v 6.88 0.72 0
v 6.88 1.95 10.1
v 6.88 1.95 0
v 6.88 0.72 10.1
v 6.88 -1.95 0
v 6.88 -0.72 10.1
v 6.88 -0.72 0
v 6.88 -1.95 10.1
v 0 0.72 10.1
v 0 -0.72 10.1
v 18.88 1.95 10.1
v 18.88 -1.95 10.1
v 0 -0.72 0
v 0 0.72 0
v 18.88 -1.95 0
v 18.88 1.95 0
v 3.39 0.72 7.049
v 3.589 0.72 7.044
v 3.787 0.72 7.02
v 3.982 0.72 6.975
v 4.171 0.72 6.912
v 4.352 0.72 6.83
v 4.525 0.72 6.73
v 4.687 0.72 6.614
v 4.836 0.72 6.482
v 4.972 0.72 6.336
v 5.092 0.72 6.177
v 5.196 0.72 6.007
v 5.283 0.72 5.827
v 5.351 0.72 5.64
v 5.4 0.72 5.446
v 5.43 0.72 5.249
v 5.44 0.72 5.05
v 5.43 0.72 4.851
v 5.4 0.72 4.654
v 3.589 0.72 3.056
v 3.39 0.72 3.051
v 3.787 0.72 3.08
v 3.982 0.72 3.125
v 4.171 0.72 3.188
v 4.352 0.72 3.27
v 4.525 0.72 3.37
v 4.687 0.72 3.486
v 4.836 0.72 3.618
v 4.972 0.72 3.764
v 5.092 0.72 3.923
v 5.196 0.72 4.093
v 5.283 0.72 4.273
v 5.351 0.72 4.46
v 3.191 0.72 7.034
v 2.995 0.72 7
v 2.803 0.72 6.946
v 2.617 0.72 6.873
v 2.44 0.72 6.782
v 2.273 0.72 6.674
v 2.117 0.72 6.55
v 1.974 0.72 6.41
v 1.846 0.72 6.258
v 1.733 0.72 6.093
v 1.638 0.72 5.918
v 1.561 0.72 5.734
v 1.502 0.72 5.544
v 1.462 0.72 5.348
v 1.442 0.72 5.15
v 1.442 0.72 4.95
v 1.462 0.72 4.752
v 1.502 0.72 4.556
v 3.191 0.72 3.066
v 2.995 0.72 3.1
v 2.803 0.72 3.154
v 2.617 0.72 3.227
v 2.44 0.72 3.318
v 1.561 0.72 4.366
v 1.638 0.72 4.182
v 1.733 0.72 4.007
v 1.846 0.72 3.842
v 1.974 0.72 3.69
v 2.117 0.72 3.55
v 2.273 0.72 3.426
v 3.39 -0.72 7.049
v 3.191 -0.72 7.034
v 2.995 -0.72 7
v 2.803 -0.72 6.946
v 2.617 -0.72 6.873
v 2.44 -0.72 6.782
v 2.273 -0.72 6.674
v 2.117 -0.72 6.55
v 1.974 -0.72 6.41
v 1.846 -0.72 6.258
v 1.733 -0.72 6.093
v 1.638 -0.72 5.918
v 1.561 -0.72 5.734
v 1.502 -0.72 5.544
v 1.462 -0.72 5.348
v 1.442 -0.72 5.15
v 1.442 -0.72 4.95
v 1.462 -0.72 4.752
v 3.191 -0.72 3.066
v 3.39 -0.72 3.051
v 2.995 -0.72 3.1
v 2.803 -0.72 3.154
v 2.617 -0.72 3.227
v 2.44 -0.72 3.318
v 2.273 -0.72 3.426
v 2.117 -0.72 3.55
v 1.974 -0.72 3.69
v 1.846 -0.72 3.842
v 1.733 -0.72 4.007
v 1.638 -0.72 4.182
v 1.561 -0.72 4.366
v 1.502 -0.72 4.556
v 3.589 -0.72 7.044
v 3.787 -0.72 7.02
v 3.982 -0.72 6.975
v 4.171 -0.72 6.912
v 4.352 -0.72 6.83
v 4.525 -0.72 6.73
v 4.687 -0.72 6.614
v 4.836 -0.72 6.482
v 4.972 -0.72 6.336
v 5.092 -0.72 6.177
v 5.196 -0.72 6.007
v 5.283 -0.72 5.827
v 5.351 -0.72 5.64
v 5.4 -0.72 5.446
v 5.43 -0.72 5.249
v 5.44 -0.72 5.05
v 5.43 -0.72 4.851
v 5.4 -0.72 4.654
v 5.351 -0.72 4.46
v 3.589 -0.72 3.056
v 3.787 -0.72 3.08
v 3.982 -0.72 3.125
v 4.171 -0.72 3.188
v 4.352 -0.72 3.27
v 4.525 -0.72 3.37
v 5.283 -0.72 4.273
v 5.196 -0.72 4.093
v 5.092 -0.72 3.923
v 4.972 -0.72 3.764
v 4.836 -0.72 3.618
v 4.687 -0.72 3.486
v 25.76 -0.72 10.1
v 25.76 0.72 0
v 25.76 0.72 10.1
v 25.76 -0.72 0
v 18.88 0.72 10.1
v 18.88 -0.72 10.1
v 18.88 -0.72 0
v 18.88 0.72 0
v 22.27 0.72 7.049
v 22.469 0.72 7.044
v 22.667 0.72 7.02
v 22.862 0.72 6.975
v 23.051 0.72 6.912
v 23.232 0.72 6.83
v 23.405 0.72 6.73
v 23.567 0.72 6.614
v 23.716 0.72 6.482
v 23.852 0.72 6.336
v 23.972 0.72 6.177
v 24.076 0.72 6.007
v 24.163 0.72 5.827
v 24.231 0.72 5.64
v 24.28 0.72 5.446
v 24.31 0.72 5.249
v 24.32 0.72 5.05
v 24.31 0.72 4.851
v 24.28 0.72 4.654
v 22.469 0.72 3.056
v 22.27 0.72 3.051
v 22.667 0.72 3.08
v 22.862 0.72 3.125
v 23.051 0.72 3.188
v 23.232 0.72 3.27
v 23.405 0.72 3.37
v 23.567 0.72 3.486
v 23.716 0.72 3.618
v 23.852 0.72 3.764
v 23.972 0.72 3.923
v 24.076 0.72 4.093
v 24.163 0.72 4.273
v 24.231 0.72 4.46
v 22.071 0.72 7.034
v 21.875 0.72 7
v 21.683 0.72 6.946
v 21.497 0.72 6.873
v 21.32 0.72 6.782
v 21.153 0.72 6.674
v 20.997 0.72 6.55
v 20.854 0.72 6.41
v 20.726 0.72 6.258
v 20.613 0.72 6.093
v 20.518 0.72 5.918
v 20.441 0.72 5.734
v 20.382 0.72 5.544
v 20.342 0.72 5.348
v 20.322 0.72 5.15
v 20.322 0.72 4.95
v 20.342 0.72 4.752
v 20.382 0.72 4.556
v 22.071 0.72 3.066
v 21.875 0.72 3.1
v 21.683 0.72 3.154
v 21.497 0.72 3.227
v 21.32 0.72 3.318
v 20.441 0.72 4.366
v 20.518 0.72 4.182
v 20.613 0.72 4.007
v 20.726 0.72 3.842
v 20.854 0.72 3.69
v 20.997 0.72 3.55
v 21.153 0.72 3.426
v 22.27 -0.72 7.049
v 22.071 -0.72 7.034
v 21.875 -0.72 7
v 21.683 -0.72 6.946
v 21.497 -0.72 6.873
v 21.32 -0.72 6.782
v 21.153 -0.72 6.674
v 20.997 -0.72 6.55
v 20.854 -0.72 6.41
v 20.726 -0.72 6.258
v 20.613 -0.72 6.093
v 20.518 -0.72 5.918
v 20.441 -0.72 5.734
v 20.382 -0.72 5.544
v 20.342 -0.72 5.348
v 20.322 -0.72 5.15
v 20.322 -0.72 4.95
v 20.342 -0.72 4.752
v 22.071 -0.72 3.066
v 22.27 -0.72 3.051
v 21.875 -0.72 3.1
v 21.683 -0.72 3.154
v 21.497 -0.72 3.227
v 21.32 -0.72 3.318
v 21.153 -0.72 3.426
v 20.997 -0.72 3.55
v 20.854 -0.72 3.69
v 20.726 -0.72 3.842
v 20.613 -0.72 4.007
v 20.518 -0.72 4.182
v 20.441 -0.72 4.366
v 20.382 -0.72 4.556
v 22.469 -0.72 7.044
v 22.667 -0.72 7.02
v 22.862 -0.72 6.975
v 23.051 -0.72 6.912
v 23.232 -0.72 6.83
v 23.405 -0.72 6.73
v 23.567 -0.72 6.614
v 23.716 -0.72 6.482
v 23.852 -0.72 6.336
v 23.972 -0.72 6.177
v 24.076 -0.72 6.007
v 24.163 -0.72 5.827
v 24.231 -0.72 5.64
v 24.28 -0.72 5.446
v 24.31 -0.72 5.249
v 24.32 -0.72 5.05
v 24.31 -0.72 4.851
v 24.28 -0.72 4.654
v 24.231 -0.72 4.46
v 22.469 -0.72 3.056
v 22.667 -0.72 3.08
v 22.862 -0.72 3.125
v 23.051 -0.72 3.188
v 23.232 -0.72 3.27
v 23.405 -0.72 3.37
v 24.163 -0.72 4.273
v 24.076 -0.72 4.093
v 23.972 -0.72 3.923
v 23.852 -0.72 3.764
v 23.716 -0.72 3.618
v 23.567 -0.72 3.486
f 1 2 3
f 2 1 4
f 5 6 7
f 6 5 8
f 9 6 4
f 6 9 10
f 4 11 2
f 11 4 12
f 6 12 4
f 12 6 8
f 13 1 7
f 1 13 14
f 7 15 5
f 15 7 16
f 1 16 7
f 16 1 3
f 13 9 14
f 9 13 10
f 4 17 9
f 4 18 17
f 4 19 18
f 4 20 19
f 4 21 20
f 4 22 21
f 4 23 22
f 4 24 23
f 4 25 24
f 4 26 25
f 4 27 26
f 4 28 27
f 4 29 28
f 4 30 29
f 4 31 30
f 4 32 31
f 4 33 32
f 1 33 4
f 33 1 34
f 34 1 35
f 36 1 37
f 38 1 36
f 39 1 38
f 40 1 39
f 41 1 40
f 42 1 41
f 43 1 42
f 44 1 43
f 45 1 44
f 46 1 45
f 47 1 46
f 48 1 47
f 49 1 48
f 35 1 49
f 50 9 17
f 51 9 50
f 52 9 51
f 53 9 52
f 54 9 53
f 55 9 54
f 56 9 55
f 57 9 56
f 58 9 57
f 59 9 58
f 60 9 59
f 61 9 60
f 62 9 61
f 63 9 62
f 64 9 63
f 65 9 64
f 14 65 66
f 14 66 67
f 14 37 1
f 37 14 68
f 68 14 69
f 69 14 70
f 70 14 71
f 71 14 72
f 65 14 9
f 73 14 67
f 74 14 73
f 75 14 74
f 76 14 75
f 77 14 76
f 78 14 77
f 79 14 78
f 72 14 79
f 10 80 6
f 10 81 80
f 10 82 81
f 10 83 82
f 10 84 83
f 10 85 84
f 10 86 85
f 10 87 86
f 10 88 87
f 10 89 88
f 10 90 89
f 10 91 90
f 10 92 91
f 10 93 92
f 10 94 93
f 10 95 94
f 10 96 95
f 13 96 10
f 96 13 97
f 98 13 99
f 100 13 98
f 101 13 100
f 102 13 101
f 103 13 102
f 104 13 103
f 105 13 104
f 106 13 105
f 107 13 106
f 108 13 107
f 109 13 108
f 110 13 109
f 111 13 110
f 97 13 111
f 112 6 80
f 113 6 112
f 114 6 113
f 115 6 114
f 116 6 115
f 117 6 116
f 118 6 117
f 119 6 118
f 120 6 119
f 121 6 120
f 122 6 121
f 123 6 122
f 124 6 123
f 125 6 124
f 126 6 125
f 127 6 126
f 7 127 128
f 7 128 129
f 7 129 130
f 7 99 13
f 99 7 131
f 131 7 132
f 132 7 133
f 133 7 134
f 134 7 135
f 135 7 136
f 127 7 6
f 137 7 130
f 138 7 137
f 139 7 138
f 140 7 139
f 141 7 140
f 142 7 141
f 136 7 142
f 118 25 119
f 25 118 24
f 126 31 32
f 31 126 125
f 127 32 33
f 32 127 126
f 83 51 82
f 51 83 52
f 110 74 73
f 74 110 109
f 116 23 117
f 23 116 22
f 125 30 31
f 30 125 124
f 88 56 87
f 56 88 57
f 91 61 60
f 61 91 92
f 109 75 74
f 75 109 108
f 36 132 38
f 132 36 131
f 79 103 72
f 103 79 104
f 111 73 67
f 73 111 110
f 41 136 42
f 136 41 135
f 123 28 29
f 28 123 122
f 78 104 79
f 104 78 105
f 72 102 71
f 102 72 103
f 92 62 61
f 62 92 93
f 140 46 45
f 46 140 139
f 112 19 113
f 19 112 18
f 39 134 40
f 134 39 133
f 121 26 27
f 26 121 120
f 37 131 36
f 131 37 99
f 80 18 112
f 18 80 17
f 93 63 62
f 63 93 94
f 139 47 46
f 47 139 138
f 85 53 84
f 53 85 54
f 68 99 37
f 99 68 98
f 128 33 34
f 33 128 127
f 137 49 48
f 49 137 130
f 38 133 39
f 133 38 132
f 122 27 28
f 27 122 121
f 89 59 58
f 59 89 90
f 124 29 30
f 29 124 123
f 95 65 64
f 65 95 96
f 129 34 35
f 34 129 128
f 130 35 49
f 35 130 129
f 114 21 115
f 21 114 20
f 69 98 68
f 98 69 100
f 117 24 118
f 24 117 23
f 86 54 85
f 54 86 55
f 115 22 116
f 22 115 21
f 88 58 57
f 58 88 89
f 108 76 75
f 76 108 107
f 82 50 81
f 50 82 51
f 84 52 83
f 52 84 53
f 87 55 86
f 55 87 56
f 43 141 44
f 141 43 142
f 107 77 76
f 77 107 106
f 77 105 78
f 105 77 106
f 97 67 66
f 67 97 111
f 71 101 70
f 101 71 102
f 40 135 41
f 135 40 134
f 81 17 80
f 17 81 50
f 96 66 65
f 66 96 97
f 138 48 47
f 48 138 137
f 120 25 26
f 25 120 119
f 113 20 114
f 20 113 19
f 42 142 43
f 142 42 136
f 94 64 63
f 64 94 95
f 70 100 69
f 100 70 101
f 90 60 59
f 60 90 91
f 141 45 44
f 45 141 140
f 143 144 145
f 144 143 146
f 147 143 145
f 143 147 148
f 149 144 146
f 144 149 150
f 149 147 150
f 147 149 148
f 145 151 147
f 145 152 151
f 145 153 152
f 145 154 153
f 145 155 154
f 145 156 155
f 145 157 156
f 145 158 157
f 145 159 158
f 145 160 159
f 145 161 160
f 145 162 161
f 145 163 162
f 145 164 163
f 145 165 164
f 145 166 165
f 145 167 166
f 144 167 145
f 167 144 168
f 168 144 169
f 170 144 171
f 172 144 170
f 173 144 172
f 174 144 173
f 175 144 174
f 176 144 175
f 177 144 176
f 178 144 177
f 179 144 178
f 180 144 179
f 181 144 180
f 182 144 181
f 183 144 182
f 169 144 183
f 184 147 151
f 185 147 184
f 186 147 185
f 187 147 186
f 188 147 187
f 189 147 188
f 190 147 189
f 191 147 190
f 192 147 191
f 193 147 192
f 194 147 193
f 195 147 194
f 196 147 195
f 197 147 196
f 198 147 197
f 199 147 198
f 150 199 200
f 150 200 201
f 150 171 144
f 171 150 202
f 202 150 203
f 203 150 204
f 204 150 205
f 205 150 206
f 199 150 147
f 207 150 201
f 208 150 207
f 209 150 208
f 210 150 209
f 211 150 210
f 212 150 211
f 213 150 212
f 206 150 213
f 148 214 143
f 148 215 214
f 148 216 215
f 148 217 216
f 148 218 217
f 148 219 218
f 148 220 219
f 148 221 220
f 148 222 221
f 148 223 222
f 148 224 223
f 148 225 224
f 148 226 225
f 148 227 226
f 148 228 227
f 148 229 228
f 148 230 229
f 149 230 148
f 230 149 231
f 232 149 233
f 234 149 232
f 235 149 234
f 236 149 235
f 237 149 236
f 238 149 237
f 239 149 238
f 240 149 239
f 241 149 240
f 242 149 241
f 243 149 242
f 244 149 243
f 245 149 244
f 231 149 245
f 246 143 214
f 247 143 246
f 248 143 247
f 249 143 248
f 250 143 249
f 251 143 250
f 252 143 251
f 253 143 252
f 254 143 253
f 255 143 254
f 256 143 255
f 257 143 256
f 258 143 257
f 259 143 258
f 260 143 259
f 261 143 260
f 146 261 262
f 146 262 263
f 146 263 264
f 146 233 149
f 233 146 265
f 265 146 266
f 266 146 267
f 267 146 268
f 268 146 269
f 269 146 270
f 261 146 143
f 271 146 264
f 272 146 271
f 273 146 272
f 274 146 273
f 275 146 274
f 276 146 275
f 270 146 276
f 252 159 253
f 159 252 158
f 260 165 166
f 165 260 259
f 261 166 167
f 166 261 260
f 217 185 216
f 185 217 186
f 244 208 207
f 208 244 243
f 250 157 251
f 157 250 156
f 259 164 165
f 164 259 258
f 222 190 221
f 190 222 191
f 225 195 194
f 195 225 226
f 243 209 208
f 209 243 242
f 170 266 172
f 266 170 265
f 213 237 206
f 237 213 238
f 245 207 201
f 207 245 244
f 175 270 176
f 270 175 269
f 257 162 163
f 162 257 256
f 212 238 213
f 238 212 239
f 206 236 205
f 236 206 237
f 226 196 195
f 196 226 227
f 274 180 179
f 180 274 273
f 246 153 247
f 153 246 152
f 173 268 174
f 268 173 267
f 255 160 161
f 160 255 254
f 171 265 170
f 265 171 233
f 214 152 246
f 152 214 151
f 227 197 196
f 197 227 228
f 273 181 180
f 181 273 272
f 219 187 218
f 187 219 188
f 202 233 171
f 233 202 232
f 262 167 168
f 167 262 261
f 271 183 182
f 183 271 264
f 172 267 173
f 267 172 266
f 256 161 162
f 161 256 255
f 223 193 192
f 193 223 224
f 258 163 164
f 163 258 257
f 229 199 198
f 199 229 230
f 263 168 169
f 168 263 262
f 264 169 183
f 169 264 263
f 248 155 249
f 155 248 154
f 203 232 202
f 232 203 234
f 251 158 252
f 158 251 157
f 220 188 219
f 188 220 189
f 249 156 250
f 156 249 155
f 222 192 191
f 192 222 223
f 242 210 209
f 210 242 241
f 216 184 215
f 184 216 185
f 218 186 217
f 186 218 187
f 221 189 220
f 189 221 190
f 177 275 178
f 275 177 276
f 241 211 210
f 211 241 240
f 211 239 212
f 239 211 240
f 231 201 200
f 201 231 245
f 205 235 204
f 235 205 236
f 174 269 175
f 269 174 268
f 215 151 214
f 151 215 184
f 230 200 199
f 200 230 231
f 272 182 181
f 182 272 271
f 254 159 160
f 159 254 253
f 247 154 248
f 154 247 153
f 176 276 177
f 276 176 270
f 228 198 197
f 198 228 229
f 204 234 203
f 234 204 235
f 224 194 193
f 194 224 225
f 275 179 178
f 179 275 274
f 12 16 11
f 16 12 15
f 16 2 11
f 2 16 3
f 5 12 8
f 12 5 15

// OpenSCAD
$fa = 0.2;
$fs = 0.2;

tolerance = 0.2;
xy_thickness = 0.48 * 3;
z_thickness = 0.2 * 4;


bearing_inner_dia = 6.3;
bearing_ext_dia = 12.7 + tolerance * 2;
bearing_thickness = 6 + tolerance * 2;
bolt_d = 4;//2 + tolerance * 2;
nut_d = 8;


pin_space = xy_thickness * 2 + bolt_d;

handle_base_length = 25;
handle_length = 25;
handle_dia = 12;

rack_height = 60;
rack_length = 50;
rack_thickness = z_thickness + max(nut_d, bearing_thickness);

module pin_shape(dia = bearing_inner_dia) {
    cut_mult = 0.7;
    intersection() {
        circle(d = dia);
        translate([-dia*cut_mult/2,-dia/2])
        square([dia*cut_mult, dia]);
    }
}


module handle_base() {

    inner_d = bearing_inner_dia + 0.6;
    ext_d = inner_d + xy_thickness * 2;
    height = pin_space;

    module handle_shape() {
        hull() { 
            offset(xy_thickness)
            pin_shape(inner_d);
            
            translate([0,handle_base_length,0])
            circle(d = bolt_d + xy_thickness * 2);
        }
    }

    difference() {

        linear_extrude(height) {    
            
            difference() {
                offset(xy_thickness)
                pin_shape(inner_d);
                pin_shape(inner_d);
            }
            
            translate([0,handle_base_length,0])    
            difference() {
                circle(d = bolt_d + xy_thickness * 2);
                circle(d = bolt_d);
            }
            
            difference() {
                handle_shape();
            
                offset(-xy_thickness)
                handle_shape();
            }
        }

        translate([-ext_d/2-tolerance,0,height/2])
        rotate([0,90,0])
        cylinder(d = bolt_d, h = ext_d + tolerance*2);
    
    }
    
}

module handle() {
    
    nut_d = 6 + xy_thickness * 2;
    nut_thickness = 2.5;
    
    difference() {
        union() {
            cylinder(d1 = bolt_d + xy_thickness*2, d2 = handle_dia, h = handle_length * 0.5);
            translate([0,0,handle_length*0.5])
            cylinder(d = handle_dia, h = handle_length * 0.5);
        }
        
        translate([0,0,-tolerance])
        cylinder(d = bolt_d, h = handle_length + tolerance * 2);
        
        translate([0,0,handle_length - nut_thickness * 3])
        cylinder(d = nut_d, h = nut_thickness * 3 + tolerance);
        
        
        for (i=[0:60:360])
        rotate([0,0,i])
        translate([handle_dia/2 + 2.2,0,-tolerance*2])
        
        cylinder(d = 6, h = handle_length + tolerance*4);

    }
    
}

module rack() {
    
    module rack_contour() {
        hull() {
            circle(d = bearing_ext_dia + xy_thickness * 2);
            translate([rack_height,-rack_length/2])
            square([xy_thickness, rack_length]);
        }        
    }
    
    module rack_shape() {
        union() {
            difference() {
                ext_dia = bearing_ext_dia + xy_thickness * 2;
                union() {
                    circle(d = ext_dia);
                    translate([0,-xy_thickness/2])
                        square([rack_height, xy_thickness]);
                    
                    center_length = ext_dia + (rack_length - ext_dia)*0.5;
                    
                    translate([rack_height*0.5,-center_length/2])
                    square([xy_thickness, center_length]);
                }
                circle(d = bearing_ext_dia);
            }
            difference() {
                rack_contour();
                offset(-xy_thickness)
                rack_contour();
            }
        }
    }
    

    difference() {
        linear_extrude(rack_thickness)
        rack_shape();
        
        translate([rack_height-tolerance,0,z_thickness + (rack_thickness-z_thickness)/2]) {
            
            translate([0,-rack_length/4,0])
            rotate([0,90,0])
            cylinder(d = bolt_d, h = xy_thickness + tolerance*2);
            
            translate([0,rack_length/4,0])
            rotate([0,90,0])
            cylinder(d = bolt_d, h = xy_thickness + tolerance*2);
               
        }
    }
    
    linear_extrude(z_thickness)
    intersection() {
        offset(xy_thickness)
        rack_shape();
        rack_contour();
    }
}


module pin() {
    difference() {
        linear_extrude(bearing_thickness + pin_space*2)
        pin_shape();
        
        translate([-bearing_inner_dia/2,0,pin_space*0.5])
        rotate([0,90,0])
        cylinder(d = bolt_d, h = bearing_inner_dia);
        
        translate([-bearing_inner_dia/2,0,bearing_thickness + pin_space*1.5])
        rotate([0,90,0])
        cylinder(d = bolt_d, h = bearing_inner_dia);
    }
}

module pin_flat_adapter() {
    
    difference() {

        linear_extrude(pin_space)
        difference() {
            offset(tolerance + xy_thickness)
            pin_shape();
            
            offset(tolerance)
            pin_shape();
            
        }
        
        translate([-bearing_inner_dia/2-xy_thickness-tolerance*2,0,pin_space*0.5])
        rotate([0,90,0])
        cylinder(d = bolt_d, h = bearing_inner_dia + xy_thickness*2 + tolerance*4);
        
    }
    
    
    translate([0,0,pin_space])
    
    difference() {
        linear_extrude(pin_space)
        offset(tolerance + xy_thickness)
        pin_shape();
        
        translate([-bearing_inner_dia/2-xy_thickness-tolerance*2,0,pin_space*0.5])
        rotate([0,90,0])
        cylinder(d = bolt_d, h = bearing_inner_dia + xy_thickness*2 + tolerance*4);
        
        translate([-xy_thickness/2-tolerance,-bearing_inner_dia/2-xy_thickness-tolerance*2,0])
        cube([xy_thickness+tolerance*2, bearing_inner_dia + xy_thickness*2 + tolerance*4,pin_space+tolerance]);
    }
    
}

module transformer_plane() {
    
    width = 4.3 - tolerance*2;
    height = 10.5 - tolerance*2;
    length = 12;
    
    module hole_plane() {
        difference() {
        cube([pin_space, xy_thickness, height]);
        translate([pin_space/2, xy_thickness+tolerance, height/2])
        rotate([90,0,0])
        cylinder(d = bolt_d, h = xy_thickness+tolerance*2);
        }
    }
    
    translate([0,-xy_thickness/2,0])
    hole_plane();

    
    translate([pin_space,-width/2,0])
    cube([length, width, height]);
    
    translate([pin_space+length,-xy_thickness/2,0])
    hole_plane();
    
}

transformer_plane();

//rotate([180,0,0])
//pin_flat_adapter();

//rack();

//rotate([0,90,0])
//pin();
//handle_base();

//handle();
